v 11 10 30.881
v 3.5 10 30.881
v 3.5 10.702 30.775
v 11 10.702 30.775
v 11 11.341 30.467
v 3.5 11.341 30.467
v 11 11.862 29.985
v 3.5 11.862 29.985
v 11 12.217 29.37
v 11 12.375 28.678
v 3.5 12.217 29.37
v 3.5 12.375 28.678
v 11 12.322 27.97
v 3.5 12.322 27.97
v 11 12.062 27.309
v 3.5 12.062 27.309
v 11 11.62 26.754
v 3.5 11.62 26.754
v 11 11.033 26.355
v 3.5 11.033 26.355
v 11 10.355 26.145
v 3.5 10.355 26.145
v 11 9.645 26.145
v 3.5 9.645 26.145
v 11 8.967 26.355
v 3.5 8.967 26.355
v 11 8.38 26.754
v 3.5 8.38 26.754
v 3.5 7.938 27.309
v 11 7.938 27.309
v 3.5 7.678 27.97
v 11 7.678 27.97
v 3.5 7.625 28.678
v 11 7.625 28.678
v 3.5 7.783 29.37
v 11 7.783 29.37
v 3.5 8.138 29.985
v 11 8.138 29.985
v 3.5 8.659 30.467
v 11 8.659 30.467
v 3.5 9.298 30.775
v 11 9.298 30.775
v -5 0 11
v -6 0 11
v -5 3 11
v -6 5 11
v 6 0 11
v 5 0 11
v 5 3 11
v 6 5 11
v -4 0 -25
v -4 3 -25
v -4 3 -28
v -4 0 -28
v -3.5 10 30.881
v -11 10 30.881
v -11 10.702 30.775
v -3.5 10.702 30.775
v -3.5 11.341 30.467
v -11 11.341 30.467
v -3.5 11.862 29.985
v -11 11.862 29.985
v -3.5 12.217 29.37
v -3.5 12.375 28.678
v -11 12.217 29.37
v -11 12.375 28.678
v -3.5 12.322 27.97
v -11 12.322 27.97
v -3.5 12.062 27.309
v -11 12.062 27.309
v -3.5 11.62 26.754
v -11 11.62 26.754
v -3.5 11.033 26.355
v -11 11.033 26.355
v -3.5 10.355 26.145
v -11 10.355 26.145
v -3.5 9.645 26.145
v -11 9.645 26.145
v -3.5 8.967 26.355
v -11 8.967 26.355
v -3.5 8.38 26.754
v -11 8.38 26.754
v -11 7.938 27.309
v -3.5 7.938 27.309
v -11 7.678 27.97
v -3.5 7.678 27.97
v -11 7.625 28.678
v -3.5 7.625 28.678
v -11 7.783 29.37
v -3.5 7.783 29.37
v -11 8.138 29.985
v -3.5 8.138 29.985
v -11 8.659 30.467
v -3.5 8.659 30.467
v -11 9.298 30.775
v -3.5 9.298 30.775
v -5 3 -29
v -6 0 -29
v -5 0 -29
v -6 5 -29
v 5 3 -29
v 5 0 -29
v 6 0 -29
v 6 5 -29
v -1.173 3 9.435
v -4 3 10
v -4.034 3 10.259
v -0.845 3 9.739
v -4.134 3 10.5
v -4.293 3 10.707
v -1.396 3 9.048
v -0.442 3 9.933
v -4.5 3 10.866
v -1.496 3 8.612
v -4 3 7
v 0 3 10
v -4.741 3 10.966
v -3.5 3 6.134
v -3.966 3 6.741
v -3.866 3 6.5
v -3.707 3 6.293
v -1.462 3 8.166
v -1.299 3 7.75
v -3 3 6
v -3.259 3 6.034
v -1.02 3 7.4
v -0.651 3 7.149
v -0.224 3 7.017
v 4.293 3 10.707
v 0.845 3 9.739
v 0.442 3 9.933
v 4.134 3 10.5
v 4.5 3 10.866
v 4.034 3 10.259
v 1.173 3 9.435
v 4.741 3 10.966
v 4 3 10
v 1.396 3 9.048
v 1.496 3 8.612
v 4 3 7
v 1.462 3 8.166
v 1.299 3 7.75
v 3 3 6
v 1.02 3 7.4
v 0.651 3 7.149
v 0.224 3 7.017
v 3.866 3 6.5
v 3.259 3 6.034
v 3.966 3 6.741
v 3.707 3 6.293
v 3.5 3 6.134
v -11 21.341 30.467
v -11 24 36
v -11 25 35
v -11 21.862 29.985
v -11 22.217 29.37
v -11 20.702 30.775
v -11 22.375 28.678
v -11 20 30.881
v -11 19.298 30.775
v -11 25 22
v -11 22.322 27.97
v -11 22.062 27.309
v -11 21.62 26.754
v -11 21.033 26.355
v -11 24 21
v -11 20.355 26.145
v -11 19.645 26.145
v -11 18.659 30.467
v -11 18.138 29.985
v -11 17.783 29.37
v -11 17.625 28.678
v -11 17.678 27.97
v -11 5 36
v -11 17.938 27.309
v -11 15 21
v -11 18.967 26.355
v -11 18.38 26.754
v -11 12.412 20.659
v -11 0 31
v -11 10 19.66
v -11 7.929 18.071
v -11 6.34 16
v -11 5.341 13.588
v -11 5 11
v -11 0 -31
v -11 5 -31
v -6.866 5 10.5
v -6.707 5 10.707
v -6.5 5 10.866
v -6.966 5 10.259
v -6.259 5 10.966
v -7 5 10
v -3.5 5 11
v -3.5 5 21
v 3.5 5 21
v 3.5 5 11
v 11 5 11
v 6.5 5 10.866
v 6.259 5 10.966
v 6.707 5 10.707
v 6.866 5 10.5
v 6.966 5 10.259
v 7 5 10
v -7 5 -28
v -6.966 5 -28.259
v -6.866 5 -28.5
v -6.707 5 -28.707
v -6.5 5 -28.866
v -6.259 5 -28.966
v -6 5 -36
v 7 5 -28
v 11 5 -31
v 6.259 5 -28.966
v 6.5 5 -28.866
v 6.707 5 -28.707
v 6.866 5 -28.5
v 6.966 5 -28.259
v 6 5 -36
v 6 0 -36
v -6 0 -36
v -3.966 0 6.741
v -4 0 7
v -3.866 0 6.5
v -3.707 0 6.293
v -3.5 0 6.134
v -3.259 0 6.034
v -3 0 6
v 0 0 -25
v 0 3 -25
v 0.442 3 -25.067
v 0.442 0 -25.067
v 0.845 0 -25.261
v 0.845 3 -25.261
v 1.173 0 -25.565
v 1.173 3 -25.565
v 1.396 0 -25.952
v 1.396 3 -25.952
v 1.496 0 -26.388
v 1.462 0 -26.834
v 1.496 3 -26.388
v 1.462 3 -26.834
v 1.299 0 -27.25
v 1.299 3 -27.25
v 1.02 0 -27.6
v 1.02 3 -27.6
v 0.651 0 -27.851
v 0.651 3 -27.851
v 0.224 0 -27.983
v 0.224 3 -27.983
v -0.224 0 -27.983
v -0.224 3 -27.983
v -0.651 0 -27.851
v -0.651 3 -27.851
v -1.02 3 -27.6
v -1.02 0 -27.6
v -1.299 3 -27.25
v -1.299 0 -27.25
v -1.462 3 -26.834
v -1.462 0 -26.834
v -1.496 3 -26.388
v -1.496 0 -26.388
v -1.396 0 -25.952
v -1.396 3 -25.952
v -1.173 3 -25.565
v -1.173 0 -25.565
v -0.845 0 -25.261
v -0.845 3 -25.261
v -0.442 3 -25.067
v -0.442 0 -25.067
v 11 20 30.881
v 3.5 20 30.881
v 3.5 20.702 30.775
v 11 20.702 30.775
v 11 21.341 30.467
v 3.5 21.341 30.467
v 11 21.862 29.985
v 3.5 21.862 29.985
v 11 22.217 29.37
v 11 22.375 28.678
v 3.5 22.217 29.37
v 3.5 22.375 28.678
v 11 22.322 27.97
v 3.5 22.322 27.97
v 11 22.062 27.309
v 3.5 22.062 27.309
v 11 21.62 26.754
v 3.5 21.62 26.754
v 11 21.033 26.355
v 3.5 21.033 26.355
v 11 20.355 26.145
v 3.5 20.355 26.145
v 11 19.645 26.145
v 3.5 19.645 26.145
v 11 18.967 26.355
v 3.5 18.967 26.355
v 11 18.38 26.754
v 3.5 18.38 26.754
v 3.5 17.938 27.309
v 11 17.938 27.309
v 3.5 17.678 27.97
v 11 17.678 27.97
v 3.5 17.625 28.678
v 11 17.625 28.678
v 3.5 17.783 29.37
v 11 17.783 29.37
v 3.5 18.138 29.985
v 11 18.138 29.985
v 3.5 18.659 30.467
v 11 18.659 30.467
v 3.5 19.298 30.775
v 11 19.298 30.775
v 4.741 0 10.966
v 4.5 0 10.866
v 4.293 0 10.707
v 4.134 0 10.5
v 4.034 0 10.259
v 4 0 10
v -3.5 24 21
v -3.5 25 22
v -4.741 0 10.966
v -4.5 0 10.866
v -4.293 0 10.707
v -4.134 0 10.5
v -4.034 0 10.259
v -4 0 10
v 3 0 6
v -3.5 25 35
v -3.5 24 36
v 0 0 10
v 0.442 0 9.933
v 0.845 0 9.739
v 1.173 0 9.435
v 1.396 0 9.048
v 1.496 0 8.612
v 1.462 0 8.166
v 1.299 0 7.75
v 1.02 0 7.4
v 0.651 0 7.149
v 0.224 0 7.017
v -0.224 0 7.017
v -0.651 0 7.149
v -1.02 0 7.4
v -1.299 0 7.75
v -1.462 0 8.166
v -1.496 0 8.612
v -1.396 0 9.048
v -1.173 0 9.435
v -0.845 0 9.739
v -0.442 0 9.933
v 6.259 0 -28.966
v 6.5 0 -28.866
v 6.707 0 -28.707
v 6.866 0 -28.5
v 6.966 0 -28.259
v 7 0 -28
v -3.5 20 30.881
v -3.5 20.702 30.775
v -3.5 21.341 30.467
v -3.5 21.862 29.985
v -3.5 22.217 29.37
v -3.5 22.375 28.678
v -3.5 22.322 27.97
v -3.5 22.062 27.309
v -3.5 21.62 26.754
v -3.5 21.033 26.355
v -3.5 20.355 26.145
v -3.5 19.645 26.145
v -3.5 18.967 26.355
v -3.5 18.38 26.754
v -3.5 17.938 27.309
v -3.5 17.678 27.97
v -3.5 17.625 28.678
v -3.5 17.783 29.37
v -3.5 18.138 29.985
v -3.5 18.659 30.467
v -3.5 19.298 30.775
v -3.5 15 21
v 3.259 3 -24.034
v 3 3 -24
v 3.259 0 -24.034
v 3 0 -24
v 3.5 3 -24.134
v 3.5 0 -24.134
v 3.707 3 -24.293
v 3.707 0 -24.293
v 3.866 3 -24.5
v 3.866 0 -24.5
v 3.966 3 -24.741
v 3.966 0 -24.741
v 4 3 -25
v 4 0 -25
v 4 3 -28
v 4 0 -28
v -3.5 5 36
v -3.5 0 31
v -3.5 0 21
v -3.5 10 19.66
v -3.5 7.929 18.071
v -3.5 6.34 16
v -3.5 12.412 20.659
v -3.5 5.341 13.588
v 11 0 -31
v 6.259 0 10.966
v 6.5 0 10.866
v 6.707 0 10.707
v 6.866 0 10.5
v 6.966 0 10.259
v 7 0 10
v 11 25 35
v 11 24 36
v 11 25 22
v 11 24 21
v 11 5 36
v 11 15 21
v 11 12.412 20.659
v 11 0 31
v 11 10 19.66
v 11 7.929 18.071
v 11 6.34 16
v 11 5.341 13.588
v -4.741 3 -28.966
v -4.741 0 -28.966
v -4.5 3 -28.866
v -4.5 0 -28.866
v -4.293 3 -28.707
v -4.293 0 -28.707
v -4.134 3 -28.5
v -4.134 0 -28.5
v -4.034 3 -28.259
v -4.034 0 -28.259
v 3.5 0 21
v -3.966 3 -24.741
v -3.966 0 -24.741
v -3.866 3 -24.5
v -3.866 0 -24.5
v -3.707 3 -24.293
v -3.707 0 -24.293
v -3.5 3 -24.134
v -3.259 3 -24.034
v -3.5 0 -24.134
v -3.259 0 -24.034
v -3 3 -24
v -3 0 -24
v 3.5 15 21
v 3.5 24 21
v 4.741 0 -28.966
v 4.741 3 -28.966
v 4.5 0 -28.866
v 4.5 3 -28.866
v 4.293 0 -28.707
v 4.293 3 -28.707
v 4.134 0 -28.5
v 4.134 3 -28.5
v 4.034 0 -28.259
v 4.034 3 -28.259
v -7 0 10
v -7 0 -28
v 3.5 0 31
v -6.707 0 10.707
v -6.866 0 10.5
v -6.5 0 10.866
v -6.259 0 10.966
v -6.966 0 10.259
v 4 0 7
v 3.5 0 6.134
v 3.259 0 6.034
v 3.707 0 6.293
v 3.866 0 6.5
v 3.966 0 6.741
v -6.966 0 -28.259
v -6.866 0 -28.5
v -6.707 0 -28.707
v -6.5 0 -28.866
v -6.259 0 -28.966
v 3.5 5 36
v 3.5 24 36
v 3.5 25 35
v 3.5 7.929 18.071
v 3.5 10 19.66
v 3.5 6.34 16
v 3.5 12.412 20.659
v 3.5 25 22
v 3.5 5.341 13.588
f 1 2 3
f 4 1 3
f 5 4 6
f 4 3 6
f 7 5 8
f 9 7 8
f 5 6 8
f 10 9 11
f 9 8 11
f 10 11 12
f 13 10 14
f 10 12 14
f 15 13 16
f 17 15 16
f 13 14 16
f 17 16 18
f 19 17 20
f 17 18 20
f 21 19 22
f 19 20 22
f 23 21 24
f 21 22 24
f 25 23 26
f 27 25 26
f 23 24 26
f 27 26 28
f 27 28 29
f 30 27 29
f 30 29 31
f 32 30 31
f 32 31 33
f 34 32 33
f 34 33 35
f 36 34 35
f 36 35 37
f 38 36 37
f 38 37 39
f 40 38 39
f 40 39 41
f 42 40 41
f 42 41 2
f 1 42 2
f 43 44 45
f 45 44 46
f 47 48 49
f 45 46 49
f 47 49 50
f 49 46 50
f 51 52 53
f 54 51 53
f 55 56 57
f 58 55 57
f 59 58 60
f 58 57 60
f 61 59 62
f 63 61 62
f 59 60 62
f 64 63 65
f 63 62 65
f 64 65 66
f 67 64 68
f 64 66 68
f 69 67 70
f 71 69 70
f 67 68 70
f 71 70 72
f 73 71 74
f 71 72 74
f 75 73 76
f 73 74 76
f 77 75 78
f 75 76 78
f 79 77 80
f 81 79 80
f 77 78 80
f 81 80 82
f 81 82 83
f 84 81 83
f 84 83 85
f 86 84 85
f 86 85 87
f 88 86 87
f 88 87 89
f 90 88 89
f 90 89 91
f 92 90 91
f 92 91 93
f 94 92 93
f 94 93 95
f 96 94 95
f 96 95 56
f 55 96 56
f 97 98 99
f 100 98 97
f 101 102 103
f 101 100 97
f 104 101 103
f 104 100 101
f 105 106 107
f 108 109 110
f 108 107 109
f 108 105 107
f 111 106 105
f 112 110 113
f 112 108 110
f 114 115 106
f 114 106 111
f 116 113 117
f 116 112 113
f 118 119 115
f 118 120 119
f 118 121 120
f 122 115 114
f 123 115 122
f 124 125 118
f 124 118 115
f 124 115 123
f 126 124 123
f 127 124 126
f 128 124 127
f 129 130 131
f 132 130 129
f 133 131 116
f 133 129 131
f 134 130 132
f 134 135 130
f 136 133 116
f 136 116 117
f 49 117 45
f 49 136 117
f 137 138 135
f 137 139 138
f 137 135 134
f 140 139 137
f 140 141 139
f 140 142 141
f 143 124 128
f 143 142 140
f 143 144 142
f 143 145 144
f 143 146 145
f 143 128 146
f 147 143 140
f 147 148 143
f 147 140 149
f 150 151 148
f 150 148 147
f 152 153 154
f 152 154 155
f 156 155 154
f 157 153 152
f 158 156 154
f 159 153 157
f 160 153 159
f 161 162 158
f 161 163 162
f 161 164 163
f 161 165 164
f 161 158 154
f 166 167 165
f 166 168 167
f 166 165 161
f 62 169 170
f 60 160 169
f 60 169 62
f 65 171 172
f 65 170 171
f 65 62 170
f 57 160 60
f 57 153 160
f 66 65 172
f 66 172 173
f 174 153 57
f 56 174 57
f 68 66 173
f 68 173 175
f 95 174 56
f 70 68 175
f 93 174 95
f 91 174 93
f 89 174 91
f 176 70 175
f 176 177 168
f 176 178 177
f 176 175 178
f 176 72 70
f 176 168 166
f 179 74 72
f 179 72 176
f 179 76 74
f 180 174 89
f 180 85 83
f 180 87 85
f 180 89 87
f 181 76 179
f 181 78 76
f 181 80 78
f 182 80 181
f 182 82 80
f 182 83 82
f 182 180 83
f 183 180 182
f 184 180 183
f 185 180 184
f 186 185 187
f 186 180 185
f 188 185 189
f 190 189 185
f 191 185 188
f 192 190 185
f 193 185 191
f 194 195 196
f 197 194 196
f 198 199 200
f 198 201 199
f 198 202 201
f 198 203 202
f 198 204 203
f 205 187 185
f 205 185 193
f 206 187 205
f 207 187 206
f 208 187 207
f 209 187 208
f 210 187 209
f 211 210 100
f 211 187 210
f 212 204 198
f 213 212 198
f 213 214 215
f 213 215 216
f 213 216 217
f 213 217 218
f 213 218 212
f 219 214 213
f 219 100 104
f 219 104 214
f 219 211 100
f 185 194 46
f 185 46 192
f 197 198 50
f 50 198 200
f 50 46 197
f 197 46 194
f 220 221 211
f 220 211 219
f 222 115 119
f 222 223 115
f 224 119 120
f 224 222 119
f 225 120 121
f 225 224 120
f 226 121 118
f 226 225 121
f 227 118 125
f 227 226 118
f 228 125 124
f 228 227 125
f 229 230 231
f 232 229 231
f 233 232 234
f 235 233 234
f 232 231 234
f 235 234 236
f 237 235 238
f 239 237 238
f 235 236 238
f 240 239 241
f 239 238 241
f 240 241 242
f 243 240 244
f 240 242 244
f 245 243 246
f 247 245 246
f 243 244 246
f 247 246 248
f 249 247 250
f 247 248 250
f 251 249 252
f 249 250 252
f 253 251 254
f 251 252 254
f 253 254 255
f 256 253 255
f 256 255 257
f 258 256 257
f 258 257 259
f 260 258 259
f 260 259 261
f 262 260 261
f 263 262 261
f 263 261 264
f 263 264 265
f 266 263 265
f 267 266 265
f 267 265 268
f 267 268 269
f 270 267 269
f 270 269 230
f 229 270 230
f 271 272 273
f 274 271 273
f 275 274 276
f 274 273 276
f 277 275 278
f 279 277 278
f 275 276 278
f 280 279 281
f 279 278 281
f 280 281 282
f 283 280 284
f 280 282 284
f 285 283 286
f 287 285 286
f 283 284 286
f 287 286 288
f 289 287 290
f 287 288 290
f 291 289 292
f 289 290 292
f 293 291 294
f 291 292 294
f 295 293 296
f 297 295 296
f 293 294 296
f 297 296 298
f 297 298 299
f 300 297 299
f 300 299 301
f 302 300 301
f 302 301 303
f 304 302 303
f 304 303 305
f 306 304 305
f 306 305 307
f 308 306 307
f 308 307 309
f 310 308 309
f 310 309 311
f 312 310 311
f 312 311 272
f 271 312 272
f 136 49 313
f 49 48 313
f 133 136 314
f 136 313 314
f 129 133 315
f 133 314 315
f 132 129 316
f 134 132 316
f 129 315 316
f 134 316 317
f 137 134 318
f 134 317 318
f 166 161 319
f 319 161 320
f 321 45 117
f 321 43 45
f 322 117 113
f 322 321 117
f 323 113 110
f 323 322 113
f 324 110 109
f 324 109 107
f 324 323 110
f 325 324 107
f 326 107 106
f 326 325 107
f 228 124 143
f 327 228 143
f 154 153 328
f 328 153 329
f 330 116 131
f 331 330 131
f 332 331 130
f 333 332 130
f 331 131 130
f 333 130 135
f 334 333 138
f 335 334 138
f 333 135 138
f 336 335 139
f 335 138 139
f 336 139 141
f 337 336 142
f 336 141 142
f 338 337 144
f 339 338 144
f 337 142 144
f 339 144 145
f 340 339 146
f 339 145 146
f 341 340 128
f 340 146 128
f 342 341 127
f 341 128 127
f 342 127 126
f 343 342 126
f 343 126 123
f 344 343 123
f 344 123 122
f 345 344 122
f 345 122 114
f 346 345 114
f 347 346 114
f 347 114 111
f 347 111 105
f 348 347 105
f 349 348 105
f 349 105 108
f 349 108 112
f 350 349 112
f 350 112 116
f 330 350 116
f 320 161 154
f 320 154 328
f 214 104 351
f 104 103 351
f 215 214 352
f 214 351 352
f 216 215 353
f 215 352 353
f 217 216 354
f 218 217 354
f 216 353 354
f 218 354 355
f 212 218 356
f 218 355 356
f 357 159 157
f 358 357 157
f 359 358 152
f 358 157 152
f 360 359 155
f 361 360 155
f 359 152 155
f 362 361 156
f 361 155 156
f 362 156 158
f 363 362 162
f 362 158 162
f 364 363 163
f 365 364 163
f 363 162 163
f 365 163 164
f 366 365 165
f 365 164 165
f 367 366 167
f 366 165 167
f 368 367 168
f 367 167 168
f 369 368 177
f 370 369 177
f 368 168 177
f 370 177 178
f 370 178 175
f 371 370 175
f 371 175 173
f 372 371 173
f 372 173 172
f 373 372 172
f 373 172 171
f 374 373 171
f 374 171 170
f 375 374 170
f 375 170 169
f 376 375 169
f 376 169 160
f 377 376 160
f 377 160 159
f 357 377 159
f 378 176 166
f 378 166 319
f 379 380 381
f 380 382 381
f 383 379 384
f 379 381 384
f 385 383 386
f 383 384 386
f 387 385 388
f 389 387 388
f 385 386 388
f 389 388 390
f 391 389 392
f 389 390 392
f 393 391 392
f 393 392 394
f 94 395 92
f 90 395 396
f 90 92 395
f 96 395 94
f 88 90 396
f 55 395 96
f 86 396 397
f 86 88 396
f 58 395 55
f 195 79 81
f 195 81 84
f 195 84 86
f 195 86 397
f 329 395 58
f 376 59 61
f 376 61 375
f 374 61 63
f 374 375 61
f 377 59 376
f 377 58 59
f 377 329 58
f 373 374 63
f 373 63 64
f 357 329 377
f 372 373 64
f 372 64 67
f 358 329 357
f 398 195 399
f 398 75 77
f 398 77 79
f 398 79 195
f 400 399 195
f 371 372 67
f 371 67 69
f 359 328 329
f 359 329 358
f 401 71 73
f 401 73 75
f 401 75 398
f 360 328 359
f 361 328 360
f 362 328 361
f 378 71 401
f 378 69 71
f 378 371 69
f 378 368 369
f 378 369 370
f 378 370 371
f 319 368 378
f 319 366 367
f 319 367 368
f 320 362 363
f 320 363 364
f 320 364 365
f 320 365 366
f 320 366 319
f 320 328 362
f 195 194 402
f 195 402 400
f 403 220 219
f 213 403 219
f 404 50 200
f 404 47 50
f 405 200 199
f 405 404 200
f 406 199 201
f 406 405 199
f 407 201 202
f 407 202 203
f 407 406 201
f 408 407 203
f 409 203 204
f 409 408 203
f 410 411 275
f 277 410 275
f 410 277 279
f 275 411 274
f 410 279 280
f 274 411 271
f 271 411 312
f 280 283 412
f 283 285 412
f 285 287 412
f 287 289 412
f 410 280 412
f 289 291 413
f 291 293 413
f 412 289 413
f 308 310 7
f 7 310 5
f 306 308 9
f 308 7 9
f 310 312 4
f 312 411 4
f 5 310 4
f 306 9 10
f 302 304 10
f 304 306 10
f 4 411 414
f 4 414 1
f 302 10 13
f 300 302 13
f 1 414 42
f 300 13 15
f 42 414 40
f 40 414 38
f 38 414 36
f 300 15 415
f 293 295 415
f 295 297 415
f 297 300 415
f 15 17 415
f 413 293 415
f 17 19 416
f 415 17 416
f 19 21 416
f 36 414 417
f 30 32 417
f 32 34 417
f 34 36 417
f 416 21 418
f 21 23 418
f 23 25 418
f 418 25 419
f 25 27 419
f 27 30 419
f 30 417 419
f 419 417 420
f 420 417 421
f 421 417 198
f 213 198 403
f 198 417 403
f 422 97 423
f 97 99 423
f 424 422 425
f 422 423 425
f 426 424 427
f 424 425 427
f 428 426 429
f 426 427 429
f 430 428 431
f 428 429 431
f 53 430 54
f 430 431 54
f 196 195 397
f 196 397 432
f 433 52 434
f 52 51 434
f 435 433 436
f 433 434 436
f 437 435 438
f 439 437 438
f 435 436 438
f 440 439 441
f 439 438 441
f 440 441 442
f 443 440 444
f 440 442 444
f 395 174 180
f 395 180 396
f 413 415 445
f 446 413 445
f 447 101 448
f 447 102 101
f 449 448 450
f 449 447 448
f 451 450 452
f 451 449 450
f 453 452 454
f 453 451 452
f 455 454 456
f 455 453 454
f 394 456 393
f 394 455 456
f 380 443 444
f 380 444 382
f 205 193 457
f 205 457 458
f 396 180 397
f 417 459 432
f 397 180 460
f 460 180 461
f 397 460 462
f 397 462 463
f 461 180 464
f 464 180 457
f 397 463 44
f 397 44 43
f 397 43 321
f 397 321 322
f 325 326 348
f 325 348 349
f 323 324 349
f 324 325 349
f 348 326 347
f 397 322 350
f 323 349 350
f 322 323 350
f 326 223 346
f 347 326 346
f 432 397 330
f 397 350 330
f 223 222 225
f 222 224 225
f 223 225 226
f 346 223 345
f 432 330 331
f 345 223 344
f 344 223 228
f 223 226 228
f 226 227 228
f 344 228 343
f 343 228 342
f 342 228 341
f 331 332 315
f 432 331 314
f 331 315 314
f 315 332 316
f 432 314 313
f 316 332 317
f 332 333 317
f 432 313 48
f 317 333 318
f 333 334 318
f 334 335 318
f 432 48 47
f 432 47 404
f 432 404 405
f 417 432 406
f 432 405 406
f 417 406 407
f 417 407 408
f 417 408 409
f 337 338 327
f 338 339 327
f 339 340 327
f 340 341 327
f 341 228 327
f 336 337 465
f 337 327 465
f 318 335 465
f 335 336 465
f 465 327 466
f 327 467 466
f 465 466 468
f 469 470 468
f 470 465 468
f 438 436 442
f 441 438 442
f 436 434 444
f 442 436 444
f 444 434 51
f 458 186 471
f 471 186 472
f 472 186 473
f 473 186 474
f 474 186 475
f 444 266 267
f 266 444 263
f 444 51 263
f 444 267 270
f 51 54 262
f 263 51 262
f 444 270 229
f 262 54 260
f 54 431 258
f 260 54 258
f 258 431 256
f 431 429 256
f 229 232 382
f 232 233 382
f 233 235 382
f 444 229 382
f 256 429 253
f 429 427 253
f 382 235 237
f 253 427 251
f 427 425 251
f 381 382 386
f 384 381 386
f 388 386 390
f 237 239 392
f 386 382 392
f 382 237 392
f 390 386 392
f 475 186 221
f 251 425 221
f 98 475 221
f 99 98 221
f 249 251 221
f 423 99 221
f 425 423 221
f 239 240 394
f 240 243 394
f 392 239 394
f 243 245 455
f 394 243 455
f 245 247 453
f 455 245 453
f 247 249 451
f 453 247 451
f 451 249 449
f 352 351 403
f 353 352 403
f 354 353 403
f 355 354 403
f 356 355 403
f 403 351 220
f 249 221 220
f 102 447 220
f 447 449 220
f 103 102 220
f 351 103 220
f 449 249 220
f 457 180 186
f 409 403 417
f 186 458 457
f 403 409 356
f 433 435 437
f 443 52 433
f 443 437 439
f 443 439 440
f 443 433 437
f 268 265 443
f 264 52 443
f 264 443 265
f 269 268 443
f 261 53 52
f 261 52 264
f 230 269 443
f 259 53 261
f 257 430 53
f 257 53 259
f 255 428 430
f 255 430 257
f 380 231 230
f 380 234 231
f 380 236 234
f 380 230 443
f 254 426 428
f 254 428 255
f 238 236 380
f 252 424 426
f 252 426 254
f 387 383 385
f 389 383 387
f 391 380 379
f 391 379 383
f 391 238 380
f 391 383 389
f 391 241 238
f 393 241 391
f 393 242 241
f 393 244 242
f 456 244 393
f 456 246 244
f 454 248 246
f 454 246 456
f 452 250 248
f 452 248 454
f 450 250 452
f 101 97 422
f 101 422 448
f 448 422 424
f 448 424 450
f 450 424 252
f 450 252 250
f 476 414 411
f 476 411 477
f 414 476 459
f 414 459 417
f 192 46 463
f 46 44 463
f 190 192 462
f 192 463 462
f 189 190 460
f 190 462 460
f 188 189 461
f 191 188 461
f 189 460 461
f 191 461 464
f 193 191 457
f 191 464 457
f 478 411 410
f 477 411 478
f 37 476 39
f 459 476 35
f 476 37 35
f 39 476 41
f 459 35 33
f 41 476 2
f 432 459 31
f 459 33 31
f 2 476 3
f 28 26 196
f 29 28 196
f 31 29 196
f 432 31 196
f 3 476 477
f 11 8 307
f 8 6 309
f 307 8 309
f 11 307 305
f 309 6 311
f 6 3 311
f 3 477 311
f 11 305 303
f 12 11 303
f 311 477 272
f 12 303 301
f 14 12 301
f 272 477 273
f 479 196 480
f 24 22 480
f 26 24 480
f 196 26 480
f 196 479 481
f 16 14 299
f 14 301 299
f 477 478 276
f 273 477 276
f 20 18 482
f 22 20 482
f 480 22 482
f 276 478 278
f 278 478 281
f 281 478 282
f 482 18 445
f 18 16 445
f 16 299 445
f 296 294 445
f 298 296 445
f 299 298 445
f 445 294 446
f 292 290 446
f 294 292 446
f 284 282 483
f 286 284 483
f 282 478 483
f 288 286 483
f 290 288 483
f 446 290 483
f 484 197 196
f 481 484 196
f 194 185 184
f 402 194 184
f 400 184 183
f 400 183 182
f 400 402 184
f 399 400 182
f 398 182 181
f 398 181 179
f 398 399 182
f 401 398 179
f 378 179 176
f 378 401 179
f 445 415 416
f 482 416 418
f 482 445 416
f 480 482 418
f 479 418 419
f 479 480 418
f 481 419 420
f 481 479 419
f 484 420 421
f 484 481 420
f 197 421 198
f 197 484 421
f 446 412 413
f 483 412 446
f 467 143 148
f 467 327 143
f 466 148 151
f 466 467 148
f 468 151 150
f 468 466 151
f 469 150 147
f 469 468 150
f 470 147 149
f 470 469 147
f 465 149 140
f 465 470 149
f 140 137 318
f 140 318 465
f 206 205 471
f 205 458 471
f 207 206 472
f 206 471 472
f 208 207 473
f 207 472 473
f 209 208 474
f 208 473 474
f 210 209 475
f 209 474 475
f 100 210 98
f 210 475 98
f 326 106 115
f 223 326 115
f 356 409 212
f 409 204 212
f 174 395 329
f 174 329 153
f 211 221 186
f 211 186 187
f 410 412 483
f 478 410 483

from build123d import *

# Parameters (mm, degrees)
SKETCH1_W           = 22
SKETCH1_H           = 72
BOSS_EXTRUDE2_DEPTH = 5
SKETCH2_W           = 14
SKETCH2_H           = 30
CUT_EXTRUDE1_DEPTH  = 38.973675092
SKETCH3_W           = 3
SKETCH3_H           = 5
CUT_EXTRUDE2_DEPTH  = 38.973675092
SKETCH4_R           = 1.5
CUT_EXTRUDE3_DEPTH  = 38.973675092
SKETCH5_W           = 7.5
SKETCH5_H           = 15
BOSS_EXTRUDE3_DEPTH = 20
CHAMFER2_SIZE       = 5
SKETCH6_W           = 7
SKETCH6_H           = 15
CUT_EXTRUDE4_DEPTH  = 43.626282972
SKETCH7_W           = 8
SKETCH7_H           = 5
CUT_EXTRUDE5_DEPTH  = 2
CHAMFER6_SIZE       = 5
FILLET3_R           = 1
FILLET6_R           = 10
SKETCH9_R           = 2.38125
CUT_EXTRUDE6_DEPTH  = 50.040799341
CHAMFER8_SIZE       = 1


with BuildPart() as part:
    # Sketch1 → Boss-Extrude2 (new body)
    with BuildSketch(Plane(origin=(0, 0, 0), x_dir=(1, 0, 0), z_dir=(0, 1, 0))):
        Rectangle(SKETCH1_W, SKETCH1_H)
    extrude(amount=BOSS_EXTRUDE2_DEPTH)

    # Sketch2 → Cut-Extrude1 (cut, through all)
    with BuildSketch(Plane(origin=(0, 5, 0), x_dir=(1, 0, 0), z_dir=(0, 1, 0))):
        with Locations((0, 9)):
            Rectangle(SKETCH2_W, SKETCH2_H)
    extrude(amount=-CUT_EXTRUDE1_DEPTH, mode=Mode.SUBTRACT)

    # Sketch3 → Cut-Extrude2 (cut, through all)
    with BuildSketch(Plane(origin=(0, 5, 0), x_dir=(1, 0, 0), z_dir=(0, 1, 0))):
        with Locations((-5.5, 26.5)):
            Rectangle(SKETCH3_W, SKETCH3_H)
        with Locations((5.5, 26.5)):
            Rectangle(SKETCH3_W, SKETCH3_H)
        with Locations((-5.5, -8.5)):
            Rectangle(SKETCH3_W, SKETCH3_H)
        with Locations((5.5, -8.5)):
            Rectangle(SKETCH3_W, SKETCH3_H)
    extrude(amount=-CUT_EXTRUDE2_DEPTH, mode=Mode.SUBTRACT)

    # Sketch4 → Cut-Extrude3 (cut, through all)
    with BuildSketch(Plane(origin=(0, 5, 0), x_dir=(1, 0, 0), z_dir=(0, 1, 0))):
        with Locations(Location((0, 26.5, 0), (0, 0, 270))):
            Circle(SKETCH4_R)
        with Locations(Location((0, -8.5, 0), (0, 0, 270))):
            Circle(SKETCH4_R)
    extrude(amount=-CUT_EXTRUDE3_DEPTH, mode=Mode.SUBTRACT)

    # Sketch5 → Boss-Extrude3 (add)
    with BuildSketch(Plane(origin=(0, 5, 0), x_dir=(1, 0, 0), z_dir=(0, 1, 0))):
        with Locations((-7.25, -28.5)):
            Rectangle(SKETCH5_W, SKETCH5_H)
    boss_extrude3 = extrude(amount=BOSS_EXTRUDE3_DEPTH)

    # Mirror1: Boss-Extrude3 across plane
    add(boss_extrude3.mirror(Plane(origin=(0, 0, 0), x_dir=(0, 0, 1), z_dir=(1, 0, 0))))

    # Chamfer2
    chamfer2_edges = [part.edges().sort_by_distance(p)[0] for p in [
        (0, 0, 36),
    ]]
    chamfer(chamfer2_edges, length=CHAMFER2_SIZE - 0.0001)  # a hair under: the kernel refuses the full size

    # Sketch6 → Cut-Extrude4 (cut, through all)
    with BuildSketch(Plane(origin=(0, 5, 0), x_dir=(1, 0, 0), z_dir=(0, 1, 0))):
        with Locations((0, -28.5)):
            Rectangle(SKETCH6_W, SKETCH6_H)
    extrude(amount=-CUT_EXTRUDE4_DEPTH, mode=Mode.SUBTRACT)

    # Sketch7 → Cut-Extrude5 (cut)
    with BuildSketch(Plane(origin=(0, 5, 0), x_dir=(1, 0, 0), z_dir=(0, 1, 0))):
        with Locations((0, 26.5)):
            Rectangle(SKETCH7_W, SKETCH7_H)
        with Locations((0, -8.5)):
            Rectangle(SKETCH7_W, SKETCH7_H)
    extrude(amount=-CUT_EXTRUDE5_DEPTH, mode=Mode.SUBTRACT)

    # Chamfer6
    chamfer6_edges = [part.edges().sort_by_distance(p)[0] for p in [
        (-11, 2.5, -36),
        (11, 2.5, -36),
    ]]
    chamfer(chamfer6_edges, length=CHAMFER6_SIZE)

    # Fillet3
    fillet3_edges = [part.edges().sort_by_distance(p)[0] for p in [
        (-7, 2.5, -29),
        (-4, 1.5, -29),
        (-4, 1.5, -24),
        (7, 2.5, -29),
        (4, 1.5, -24),
        (4, 1.5, -29),
        (-7, 2.5, 11),
        (-4, 1.5, 6),
        (-4, 1.5, 11),
        (7, 2.5, 11),
        (4, 1.5, 11),
        (4, 1.5, 6),
    ]]
    fillet(fillet3_edges, radius=FILLET3_R)

    # Fillet6
    fillet6_edges = [part.edges().sort_by_distance(p)[0] for p in [
        (-7.25, 5, 21),
        (7.25, 5, 21),
    ]]
    fillet(fillet6_edges, radius=FILLET6_R - 0.0001)  # a hair under: the kernel refuses the full size

    # Sketch9 → Cut-Extrude6 (cut, through all)
    with BuildSketch(Plane.ZY.offset(11)):
        with Locations((28.5, 20)):
            Circle(SKETCH9_R)
        with Locations((28.5, 10)):
            Circle(SKETCH9_R)
    extrude(amount=-CUT_EXTRUDE6_DEPTH, mode=Mode.SUBTRACT)

    # Chamfer8
    chamfer8_edges = [part.edges().sort_by_distance(p)[0] for p in [
        (-7.25, 25, 36),
        (-7.25, 25, 21),
        (7.25, 25, 21),
        (7.25, 25, 36),
    ]]
    chamfer(chamfer8_edges, length=CHAMFER8_SIZE)


solid = part.part
